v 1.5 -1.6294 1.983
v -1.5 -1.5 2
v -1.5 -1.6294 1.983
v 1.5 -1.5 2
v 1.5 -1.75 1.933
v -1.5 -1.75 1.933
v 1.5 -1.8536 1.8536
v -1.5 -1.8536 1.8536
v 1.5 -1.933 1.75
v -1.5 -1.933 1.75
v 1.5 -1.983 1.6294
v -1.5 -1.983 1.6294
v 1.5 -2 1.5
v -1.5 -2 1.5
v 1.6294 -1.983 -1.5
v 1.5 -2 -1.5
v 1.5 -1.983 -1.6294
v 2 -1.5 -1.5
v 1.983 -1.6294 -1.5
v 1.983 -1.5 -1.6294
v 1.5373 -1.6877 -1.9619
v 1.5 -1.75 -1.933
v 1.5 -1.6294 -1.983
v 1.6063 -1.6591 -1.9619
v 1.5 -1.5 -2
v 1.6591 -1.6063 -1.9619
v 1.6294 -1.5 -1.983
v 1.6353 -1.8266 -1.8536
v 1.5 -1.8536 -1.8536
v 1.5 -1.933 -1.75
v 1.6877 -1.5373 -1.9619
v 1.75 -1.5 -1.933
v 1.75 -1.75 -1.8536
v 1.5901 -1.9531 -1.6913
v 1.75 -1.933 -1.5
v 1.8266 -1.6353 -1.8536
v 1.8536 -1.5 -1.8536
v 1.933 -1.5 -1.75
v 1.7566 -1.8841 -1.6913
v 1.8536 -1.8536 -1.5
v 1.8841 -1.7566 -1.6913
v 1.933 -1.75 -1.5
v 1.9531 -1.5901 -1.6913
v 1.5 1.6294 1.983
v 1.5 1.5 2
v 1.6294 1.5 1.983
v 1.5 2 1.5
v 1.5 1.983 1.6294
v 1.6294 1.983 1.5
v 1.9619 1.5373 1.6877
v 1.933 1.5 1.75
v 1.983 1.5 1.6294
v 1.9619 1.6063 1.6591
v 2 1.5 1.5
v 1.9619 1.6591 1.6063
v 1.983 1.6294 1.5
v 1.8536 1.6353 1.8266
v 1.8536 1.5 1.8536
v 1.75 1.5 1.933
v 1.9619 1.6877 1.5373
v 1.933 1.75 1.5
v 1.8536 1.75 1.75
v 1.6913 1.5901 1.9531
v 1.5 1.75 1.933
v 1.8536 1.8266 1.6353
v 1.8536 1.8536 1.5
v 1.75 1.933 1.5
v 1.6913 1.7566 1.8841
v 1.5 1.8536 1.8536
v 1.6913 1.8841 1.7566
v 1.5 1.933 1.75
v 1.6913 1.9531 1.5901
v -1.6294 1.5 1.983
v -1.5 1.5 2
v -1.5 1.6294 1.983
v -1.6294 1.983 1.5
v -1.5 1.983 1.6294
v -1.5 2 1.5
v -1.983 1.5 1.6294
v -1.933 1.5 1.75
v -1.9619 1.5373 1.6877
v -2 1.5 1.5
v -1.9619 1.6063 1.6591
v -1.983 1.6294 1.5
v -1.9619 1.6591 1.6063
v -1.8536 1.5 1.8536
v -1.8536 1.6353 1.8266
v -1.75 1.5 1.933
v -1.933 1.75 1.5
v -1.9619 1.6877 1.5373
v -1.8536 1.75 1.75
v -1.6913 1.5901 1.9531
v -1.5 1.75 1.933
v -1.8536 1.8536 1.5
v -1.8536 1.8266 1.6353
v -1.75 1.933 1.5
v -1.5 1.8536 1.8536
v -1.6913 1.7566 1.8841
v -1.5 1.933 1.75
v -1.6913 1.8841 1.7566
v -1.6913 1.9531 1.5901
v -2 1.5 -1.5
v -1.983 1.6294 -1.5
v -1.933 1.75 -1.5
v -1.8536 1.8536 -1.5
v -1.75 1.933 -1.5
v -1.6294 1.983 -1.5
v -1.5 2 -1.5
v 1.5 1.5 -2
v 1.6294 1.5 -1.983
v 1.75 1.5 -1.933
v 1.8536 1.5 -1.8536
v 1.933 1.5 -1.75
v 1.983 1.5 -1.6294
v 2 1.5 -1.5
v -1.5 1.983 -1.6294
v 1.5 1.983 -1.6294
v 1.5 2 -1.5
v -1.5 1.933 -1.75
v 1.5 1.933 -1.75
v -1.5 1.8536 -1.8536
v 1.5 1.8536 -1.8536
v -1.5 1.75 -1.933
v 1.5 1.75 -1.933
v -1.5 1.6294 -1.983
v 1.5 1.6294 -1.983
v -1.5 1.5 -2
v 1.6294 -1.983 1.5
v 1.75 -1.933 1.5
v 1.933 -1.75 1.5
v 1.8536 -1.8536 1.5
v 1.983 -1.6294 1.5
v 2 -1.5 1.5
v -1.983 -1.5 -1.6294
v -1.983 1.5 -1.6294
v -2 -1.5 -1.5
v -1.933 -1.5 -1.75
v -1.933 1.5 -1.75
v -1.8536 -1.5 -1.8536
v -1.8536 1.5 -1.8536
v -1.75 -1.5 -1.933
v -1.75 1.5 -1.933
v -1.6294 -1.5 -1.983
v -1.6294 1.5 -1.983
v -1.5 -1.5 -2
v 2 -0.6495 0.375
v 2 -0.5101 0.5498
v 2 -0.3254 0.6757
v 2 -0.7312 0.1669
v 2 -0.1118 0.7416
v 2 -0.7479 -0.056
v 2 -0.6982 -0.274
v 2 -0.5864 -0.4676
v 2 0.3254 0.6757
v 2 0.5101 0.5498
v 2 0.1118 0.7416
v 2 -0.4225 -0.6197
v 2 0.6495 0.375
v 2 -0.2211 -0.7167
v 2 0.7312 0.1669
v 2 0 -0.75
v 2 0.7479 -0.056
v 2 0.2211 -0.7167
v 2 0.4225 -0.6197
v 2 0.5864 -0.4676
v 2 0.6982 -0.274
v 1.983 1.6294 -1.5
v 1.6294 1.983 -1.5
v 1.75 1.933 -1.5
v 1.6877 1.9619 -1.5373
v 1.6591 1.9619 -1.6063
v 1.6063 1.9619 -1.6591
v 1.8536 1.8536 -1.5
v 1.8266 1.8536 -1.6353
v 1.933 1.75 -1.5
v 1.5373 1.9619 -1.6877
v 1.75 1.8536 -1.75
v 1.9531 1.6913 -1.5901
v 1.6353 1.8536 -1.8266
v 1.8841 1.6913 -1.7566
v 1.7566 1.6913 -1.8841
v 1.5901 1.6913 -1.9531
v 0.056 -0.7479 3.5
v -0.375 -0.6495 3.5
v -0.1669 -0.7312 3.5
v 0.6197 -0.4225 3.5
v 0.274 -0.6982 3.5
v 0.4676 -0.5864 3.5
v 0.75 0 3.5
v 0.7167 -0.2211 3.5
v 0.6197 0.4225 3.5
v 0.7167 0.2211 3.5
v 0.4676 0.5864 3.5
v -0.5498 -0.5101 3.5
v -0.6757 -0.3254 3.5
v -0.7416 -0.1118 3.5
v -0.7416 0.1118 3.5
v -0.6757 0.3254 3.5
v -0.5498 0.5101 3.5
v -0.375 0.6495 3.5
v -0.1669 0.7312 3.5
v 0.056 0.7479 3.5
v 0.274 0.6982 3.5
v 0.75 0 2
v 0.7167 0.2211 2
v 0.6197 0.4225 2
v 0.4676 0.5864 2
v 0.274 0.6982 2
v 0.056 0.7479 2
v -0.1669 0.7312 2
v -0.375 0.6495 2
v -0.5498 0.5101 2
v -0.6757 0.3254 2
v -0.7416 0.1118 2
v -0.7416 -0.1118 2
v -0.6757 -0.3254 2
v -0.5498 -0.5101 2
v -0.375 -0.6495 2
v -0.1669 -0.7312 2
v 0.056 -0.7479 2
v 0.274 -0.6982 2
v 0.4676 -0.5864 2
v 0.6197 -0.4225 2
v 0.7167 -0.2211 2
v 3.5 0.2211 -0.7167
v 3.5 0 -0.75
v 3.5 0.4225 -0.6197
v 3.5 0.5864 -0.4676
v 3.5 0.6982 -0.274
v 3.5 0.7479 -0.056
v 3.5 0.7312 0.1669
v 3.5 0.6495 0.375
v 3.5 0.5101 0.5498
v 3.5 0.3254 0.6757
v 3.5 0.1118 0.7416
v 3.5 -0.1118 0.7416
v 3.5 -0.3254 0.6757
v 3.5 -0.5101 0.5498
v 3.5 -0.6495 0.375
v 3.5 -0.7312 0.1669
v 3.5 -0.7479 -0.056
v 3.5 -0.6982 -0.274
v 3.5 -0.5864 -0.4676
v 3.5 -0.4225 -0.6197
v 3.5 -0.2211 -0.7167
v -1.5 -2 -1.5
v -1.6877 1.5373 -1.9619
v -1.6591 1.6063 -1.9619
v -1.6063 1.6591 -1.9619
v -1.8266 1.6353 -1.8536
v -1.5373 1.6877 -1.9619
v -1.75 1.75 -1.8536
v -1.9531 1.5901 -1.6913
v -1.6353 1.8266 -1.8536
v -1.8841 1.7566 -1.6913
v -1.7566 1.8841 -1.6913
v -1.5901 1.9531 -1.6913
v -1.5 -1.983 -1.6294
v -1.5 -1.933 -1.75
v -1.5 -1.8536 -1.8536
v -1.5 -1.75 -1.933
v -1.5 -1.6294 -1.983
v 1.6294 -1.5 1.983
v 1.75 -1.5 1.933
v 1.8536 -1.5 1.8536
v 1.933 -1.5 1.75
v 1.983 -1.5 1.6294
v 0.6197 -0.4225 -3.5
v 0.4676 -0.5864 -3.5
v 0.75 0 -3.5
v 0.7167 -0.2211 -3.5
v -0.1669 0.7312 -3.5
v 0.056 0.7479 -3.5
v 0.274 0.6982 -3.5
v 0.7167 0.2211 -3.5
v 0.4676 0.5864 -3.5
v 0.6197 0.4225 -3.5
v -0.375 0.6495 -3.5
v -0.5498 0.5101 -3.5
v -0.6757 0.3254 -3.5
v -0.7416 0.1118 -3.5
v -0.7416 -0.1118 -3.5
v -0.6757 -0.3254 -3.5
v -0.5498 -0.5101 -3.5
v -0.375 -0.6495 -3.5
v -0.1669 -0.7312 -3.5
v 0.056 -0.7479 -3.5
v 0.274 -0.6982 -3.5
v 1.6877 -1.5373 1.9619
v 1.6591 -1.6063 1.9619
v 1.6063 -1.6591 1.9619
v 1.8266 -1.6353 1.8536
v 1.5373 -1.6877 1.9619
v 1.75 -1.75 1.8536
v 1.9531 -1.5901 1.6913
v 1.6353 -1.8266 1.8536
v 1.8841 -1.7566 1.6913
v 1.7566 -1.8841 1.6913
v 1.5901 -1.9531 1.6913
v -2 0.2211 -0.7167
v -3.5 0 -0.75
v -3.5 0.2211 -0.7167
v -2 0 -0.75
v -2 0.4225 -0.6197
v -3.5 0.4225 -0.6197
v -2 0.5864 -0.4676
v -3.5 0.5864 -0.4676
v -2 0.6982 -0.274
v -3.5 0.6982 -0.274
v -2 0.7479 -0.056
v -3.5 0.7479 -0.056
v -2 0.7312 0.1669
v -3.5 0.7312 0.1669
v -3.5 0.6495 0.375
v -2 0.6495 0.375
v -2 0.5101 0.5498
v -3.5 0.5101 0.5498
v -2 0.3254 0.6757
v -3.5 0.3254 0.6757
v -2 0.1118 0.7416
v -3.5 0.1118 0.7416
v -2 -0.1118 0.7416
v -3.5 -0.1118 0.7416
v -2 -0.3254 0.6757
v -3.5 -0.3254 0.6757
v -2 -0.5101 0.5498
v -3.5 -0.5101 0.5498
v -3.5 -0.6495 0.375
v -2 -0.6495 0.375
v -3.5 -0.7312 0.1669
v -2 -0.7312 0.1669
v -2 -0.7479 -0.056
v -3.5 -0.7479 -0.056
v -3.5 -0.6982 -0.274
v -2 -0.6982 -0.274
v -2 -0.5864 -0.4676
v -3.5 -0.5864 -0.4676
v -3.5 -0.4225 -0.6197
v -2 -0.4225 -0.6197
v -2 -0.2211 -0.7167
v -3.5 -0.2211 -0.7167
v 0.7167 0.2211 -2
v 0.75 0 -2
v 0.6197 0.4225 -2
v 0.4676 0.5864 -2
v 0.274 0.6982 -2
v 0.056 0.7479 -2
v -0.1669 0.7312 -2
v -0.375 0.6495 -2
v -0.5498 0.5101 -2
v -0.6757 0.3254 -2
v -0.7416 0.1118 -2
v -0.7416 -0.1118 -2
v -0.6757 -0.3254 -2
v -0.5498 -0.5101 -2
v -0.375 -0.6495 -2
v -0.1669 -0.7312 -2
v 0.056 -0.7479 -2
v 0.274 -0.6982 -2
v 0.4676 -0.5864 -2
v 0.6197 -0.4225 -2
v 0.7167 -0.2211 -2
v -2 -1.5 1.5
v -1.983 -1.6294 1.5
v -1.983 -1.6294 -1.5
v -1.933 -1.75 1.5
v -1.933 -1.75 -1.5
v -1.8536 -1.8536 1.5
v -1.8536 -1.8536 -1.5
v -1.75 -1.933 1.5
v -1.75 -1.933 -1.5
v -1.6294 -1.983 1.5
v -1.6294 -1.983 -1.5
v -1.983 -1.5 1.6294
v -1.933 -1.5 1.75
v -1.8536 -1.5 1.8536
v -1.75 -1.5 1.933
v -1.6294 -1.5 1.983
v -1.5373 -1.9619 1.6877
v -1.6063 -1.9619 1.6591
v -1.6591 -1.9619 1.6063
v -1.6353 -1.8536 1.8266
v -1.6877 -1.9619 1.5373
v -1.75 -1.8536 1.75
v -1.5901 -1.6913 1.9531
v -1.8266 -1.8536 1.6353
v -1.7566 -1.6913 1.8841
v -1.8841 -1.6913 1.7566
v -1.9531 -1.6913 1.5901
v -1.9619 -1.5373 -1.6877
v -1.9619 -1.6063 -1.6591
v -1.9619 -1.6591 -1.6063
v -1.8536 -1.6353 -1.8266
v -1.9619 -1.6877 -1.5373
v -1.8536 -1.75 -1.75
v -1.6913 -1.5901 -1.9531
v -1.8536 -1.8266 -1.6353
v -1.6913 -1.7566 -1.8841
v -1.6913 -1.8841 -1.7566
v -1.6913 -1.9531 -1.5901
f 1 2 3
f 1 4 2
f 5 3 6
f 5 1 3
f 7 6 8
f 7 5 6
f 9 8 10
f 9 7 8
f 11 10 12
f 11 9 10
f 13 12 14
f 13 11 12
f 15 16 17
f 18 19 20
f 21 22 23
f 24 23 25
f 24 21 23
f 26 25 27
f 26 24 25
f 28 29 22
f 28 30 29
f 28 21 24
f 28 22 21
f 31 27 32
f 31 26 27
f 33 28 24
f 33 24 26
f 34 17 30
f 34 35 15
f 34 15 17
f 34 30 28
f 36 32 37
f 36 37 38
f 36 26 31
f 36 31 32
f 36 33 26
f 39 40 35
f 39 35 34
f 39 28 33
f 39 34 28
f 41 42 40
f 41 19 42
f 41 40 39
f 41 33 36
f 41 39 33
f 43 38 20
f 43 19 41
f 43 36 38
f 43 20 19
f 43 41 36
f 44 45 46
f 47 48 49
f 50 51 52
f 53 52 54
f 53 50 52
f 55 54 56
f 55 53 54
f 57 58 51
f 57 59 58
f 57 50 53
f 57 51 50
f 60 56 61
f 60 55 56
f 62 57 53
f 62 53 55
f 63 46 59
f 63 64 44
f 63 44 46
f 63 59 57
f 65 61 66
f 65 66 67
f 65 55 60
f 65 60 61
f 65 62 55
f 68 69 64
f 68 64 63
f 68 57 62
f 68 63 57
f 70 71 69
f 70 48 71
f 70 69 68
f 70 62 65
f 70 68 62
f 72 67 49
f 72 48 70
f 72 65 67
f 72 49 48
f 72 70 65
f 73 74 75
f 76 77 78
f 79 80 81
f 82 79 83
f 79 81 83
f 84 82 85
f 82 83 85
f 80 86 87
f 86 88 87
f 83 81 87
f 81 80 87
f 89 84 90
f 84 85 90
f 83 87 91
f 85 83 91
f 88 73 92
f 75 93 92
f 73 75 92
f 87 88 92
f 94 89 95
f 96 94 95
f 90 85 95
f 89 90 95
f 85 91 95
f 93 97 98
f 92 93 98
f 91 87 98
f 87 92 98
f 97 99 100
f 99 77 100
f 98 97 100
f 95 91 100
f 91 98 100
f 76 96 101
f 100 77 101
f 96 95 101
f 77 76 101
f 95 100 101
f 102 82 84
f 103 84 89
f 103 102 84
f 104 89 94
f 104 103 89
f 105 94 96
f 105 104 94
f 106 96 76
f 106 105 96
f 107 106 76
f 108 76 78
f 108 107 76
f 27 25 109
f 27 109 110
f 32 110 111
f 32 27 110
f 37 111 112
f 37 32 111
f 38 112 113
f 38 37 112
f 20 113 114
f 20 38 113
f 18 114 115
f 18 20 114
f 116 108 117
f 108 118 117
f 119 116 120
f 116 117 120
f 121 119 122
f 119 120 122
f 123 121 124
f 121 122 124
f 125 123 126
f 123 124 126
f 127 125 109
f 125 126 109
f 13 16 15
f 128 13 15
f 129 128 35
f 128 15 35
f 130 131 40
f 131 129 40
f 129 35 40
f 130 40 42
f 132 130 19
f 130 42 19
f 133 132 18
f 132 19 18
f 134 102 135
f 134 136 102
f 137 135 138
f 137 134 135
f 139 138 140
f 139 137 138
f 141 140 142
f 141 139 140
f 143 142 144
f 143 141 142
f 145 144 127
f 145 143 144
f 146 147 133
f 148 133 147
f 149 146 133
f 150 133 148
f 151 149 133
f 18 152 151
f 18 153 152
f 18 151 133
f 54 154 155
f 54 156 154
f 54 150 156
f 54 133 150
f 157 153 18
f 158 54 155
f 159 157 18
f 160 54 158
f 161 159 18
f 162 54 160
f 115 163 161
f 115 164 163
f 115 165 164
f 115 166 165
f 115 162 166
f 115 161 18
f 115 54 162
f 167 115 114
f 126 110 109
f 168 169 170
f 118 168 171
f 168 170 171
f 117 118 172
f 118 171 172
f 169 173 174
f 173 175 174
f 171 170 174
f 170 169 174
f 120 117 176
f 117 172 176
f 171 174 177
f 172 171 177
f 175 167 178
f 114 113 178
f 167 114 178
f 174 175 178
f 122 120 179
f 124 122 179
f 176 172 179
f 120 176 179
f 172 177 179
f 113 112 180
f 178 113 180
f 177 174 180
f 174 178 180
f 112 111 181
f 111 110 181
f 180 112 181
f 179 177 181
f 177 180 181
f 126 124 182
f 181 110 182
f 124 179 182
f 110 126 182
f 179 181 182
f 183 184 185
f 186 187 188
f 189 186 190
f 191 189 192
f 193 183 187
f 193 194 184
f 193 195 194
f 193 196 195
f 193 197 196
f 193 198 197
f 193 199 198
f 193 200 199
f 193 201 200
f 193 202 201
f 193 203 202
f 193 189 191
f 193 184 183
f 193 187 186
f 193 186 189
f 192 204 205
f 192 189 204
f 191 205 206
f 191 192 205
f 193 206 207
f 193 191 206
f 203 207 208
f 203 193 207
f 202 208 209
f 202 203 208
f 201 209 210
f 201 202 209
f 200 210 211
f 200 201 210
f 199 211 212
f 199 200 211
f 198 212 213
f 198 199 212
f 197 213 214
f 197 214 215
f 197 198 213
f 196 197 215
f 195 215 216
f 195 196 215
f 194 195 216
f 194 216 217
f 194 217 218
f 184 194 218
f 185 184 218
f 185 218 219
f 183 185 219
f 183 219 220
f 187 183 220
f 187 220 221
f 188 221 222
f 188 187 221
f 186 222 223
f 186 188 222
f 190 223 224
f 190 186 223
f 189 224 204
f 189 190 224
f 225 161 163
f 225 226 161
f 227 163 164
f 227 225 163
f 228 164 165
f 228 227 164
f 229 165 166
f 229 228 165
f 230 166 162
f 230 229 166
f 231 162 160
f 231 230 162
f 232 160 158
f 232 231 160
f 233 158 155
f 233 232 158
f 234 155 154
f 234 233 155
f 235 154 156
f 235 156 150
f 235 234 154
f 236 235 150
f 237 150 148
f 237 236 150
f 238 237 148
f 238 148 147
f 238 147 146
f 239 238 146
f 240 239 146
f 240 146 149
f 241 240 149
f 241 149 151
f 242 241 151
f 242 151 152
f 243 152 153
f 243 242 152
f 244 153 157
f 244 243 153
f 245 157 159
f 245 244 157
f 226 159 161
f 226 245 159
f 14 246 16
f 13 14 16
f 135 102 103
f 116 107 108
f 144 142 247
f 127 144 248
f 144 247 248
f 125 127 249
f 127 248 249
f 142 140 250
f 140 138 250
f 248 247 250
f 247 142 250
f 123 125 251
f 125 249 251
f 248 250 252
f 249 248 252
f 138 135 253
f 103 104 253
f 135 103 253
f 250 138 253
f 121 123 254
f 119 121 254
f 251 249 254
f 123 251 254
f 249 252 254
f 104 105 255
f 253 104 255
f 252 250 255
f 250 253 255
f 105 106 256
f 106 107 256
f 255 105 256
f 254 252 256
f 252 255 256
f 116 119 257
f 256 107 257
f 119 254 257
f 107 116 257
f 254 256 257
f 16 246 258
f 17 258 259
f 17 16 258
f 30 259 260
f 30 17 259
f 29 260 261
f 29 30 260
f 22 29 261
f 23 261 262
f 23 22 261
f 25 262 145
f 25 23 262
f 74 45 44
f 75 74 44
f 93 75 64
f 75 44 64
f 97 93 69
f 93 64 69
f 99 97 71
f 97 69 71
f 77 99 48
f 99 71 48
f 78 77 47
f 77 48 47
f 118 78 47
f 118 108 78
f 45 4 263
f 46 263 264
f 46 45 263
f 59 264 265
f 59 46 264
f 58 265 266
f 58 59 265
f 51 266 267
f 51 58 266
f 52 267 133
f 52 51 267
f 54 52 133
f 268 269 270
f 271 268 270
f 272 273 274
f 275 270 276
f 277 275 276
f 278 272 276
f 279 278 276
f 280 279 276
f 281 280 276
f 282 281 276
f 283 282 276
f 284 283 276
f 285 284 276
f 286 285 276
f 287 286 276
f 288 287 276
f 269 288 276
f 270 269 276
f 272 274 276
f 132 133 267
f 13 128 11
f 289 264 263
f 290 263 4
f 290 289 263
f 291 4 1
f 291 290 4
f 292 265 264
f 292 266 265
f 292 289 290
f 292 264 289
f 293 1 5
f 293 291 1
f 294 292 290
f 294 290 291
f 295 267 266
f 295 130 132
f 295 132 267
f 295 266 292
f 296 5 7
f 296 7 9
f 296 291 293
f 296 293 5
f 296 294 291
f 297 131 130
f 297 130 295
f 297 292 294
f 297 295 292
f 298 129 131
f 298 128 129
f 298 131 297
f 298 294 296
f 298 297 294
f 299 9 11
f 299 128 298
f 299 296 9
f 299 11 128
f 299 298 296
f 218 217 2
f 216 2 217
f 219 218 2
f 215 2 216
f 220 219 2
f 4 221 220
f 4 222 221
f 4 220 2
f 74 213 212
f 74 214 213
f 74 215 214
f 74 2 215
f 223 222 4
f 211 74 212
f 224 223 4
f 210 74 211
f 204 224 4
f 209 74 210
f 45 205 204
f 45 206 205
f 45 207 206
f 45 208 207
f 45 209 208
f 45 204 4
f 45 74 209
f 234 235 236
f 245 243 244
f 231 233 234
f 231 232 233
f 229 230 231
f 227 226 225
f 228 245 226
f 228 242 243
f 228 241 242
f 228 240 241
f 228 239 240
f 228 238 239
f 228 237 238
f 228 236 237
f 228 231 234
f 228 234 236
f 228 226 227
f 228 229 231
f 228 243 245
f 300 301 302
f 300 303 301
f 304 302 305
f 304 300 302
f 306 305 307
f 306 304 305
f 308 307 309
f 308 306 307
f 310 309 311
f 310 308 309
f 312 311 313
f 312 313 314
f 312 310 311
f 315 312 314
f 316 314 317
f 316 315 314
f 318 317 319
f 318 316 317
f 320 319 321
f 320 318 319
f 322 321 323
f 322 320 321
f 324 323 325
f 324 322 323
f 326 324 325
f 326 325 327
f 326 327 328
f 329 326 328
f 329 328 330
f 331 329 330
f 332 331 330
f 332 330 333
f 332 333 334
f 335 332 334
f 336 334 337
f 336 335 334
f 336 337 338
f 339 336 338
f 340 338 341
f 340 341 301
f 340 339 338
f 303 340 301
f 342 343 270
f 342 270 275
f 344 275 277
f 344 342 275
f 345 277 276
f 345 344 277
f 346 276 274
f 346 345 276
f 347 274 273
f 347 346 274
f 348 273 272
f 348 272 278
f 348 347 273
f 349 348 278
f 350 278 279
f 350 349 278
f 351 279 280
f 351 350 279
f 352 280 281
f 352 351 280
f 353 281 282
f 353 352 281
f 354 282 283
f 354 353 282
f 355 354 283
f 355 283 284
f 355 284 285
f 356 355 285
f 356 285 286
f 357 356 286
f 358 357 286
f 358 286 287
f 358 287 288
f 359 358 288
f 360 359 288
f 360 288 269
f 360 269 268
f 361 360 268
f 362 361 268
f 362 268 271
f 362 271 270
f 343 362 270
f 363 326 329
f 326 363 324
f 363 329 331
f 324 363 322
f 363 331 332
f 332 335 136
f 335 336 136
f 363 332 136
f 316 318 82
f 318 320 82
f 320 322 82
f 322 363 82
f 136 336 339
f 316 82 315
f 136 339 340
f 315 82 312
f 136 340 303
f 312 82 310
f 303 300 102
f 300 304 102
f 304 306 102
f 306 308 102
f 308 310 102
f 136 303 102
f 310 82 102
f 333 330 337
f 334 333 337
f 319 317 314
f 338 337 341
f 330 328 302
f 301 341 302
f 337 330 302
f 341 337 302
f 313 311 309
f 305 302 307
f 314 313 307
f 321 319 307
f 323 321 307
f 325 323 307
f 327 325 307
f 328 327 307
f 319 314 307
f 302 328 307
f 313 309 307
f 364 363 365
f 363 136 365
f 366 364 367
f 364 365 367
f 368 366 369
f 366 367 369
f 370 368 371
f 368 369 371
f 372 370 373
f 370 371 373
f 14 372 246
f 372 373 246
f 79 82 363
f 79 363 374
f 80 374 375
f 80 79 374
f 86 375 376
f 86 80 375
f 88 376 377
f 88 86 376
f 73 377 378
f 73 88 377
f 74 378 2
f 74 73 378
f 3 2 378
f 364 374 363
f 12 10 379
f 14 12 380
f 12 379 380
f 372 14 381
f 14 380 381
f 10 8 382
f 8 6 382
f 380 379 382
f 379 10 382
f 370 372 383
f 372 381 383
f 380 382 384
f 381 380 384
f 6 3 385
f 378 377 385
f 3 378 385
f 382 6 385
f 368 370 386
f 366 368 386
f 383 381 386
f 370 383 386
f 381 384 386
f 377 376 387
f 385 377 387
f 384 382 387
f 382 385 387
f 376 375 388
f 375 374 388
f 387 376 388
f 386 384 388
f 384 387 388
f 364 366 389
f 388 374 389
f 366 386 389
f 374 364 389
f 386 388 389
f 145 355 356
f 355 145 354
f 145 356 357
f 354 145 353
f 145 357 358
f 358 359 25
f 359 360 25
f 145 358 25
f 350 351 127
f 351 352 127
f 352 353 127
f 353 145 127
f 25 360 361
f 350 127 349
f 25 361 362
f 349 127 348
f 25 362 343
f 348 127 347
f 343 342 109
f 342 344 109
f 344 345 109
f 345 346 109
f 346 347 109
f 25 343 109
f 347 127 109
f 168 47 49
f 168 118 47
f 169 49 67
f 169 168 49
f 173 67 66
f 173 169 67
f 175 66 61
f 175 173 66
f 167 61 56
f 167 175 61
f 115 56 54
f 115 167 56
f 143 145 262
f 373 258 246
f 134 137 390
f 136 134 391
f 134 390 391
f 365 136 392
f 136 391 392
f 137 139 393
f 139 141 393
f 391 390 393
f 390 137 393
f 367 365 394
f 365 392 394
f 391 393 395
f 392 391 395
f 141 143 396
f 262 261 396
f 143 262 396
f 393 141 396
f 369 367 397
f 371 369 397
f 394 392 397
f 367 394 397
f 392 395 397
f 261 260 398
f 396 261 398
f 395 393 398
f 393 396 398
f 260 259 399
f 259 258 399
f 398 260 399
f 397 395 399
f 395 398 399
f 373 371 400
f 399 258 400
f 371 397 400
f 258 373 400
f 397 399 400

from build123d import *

# Parameters (mm, degrees)
SKETCH1_R           = 0.75
BOSS_EXTRUDE1_DEPTH = 3.5
CIRPATTERN1_COUNT   = 4
SKETCH3_W           = 4
SKETCH3_H           = 4
SKETCH3_W_2         = 1.5
SKETCH3_H_2         = 1.5
BOSS_EXTRUDE2_DEPTH = 2
FILLET1_R           = 0.5


with BuildPart() as part:
    # Sketch1 → Boss-Extrude1 (new, symmetric)
    with BuildSketch(Plane.XY):
        Circle(SKETCH1_R)
    boss_extrude1 = extrude(amount=BOSS_EXTRUDE1_DEPTH, both=True)

    # CirPattern1: Boss-Extrude1 ×4 about axis
    cirpattern1_axis = Axis((0, -1.485, 0), (0, 1, 0))
    for i in range(1, CIRPATTERN1_COUNT):
        add(boss_extrude1.rotate(cirpattern1_axis, i * 360 / CIRPATTERN1_COUNT))

    # Sketch3 → Boss-Extrude2 (add, symmetric)
    with BuildSketch(Plane(origin=(0, 0, 0), x_dir=(1, 0, 0), z_dir=(0, 1, 0))):
        Rectangle(SKETCH3_W, SKETCH3_H)
        Rectangle(SKETCH3_W_2, SKETCH3_H_2, mode=Mode.SUBTRACT)
        Rectangle(SKETCH3_W_2, SKETCH3_H_2)
    extrude(amount=BOSS_EXTRUDE2_DEPTH, both=True)

    # Fillet1
    fillet1_edges = [part.edges().sort_by_distance(p)[0] for p in [
        (0, 2, 2),
        (-2, 0, 2),
        (2, -2, 0),
        (2, 0, 2),
        (0, -2, -2),
        (2, 0, -2),
        (-2, 2, 0),
        (-2, 0, -2),
        (2, 2, 0),
        (0, 2, -2),
        (0, -2, 2),
        (-2, -2, 0),
    ]]
    fillet(fillet1_edges, radius=FILLET1_R)


solid = part.part
